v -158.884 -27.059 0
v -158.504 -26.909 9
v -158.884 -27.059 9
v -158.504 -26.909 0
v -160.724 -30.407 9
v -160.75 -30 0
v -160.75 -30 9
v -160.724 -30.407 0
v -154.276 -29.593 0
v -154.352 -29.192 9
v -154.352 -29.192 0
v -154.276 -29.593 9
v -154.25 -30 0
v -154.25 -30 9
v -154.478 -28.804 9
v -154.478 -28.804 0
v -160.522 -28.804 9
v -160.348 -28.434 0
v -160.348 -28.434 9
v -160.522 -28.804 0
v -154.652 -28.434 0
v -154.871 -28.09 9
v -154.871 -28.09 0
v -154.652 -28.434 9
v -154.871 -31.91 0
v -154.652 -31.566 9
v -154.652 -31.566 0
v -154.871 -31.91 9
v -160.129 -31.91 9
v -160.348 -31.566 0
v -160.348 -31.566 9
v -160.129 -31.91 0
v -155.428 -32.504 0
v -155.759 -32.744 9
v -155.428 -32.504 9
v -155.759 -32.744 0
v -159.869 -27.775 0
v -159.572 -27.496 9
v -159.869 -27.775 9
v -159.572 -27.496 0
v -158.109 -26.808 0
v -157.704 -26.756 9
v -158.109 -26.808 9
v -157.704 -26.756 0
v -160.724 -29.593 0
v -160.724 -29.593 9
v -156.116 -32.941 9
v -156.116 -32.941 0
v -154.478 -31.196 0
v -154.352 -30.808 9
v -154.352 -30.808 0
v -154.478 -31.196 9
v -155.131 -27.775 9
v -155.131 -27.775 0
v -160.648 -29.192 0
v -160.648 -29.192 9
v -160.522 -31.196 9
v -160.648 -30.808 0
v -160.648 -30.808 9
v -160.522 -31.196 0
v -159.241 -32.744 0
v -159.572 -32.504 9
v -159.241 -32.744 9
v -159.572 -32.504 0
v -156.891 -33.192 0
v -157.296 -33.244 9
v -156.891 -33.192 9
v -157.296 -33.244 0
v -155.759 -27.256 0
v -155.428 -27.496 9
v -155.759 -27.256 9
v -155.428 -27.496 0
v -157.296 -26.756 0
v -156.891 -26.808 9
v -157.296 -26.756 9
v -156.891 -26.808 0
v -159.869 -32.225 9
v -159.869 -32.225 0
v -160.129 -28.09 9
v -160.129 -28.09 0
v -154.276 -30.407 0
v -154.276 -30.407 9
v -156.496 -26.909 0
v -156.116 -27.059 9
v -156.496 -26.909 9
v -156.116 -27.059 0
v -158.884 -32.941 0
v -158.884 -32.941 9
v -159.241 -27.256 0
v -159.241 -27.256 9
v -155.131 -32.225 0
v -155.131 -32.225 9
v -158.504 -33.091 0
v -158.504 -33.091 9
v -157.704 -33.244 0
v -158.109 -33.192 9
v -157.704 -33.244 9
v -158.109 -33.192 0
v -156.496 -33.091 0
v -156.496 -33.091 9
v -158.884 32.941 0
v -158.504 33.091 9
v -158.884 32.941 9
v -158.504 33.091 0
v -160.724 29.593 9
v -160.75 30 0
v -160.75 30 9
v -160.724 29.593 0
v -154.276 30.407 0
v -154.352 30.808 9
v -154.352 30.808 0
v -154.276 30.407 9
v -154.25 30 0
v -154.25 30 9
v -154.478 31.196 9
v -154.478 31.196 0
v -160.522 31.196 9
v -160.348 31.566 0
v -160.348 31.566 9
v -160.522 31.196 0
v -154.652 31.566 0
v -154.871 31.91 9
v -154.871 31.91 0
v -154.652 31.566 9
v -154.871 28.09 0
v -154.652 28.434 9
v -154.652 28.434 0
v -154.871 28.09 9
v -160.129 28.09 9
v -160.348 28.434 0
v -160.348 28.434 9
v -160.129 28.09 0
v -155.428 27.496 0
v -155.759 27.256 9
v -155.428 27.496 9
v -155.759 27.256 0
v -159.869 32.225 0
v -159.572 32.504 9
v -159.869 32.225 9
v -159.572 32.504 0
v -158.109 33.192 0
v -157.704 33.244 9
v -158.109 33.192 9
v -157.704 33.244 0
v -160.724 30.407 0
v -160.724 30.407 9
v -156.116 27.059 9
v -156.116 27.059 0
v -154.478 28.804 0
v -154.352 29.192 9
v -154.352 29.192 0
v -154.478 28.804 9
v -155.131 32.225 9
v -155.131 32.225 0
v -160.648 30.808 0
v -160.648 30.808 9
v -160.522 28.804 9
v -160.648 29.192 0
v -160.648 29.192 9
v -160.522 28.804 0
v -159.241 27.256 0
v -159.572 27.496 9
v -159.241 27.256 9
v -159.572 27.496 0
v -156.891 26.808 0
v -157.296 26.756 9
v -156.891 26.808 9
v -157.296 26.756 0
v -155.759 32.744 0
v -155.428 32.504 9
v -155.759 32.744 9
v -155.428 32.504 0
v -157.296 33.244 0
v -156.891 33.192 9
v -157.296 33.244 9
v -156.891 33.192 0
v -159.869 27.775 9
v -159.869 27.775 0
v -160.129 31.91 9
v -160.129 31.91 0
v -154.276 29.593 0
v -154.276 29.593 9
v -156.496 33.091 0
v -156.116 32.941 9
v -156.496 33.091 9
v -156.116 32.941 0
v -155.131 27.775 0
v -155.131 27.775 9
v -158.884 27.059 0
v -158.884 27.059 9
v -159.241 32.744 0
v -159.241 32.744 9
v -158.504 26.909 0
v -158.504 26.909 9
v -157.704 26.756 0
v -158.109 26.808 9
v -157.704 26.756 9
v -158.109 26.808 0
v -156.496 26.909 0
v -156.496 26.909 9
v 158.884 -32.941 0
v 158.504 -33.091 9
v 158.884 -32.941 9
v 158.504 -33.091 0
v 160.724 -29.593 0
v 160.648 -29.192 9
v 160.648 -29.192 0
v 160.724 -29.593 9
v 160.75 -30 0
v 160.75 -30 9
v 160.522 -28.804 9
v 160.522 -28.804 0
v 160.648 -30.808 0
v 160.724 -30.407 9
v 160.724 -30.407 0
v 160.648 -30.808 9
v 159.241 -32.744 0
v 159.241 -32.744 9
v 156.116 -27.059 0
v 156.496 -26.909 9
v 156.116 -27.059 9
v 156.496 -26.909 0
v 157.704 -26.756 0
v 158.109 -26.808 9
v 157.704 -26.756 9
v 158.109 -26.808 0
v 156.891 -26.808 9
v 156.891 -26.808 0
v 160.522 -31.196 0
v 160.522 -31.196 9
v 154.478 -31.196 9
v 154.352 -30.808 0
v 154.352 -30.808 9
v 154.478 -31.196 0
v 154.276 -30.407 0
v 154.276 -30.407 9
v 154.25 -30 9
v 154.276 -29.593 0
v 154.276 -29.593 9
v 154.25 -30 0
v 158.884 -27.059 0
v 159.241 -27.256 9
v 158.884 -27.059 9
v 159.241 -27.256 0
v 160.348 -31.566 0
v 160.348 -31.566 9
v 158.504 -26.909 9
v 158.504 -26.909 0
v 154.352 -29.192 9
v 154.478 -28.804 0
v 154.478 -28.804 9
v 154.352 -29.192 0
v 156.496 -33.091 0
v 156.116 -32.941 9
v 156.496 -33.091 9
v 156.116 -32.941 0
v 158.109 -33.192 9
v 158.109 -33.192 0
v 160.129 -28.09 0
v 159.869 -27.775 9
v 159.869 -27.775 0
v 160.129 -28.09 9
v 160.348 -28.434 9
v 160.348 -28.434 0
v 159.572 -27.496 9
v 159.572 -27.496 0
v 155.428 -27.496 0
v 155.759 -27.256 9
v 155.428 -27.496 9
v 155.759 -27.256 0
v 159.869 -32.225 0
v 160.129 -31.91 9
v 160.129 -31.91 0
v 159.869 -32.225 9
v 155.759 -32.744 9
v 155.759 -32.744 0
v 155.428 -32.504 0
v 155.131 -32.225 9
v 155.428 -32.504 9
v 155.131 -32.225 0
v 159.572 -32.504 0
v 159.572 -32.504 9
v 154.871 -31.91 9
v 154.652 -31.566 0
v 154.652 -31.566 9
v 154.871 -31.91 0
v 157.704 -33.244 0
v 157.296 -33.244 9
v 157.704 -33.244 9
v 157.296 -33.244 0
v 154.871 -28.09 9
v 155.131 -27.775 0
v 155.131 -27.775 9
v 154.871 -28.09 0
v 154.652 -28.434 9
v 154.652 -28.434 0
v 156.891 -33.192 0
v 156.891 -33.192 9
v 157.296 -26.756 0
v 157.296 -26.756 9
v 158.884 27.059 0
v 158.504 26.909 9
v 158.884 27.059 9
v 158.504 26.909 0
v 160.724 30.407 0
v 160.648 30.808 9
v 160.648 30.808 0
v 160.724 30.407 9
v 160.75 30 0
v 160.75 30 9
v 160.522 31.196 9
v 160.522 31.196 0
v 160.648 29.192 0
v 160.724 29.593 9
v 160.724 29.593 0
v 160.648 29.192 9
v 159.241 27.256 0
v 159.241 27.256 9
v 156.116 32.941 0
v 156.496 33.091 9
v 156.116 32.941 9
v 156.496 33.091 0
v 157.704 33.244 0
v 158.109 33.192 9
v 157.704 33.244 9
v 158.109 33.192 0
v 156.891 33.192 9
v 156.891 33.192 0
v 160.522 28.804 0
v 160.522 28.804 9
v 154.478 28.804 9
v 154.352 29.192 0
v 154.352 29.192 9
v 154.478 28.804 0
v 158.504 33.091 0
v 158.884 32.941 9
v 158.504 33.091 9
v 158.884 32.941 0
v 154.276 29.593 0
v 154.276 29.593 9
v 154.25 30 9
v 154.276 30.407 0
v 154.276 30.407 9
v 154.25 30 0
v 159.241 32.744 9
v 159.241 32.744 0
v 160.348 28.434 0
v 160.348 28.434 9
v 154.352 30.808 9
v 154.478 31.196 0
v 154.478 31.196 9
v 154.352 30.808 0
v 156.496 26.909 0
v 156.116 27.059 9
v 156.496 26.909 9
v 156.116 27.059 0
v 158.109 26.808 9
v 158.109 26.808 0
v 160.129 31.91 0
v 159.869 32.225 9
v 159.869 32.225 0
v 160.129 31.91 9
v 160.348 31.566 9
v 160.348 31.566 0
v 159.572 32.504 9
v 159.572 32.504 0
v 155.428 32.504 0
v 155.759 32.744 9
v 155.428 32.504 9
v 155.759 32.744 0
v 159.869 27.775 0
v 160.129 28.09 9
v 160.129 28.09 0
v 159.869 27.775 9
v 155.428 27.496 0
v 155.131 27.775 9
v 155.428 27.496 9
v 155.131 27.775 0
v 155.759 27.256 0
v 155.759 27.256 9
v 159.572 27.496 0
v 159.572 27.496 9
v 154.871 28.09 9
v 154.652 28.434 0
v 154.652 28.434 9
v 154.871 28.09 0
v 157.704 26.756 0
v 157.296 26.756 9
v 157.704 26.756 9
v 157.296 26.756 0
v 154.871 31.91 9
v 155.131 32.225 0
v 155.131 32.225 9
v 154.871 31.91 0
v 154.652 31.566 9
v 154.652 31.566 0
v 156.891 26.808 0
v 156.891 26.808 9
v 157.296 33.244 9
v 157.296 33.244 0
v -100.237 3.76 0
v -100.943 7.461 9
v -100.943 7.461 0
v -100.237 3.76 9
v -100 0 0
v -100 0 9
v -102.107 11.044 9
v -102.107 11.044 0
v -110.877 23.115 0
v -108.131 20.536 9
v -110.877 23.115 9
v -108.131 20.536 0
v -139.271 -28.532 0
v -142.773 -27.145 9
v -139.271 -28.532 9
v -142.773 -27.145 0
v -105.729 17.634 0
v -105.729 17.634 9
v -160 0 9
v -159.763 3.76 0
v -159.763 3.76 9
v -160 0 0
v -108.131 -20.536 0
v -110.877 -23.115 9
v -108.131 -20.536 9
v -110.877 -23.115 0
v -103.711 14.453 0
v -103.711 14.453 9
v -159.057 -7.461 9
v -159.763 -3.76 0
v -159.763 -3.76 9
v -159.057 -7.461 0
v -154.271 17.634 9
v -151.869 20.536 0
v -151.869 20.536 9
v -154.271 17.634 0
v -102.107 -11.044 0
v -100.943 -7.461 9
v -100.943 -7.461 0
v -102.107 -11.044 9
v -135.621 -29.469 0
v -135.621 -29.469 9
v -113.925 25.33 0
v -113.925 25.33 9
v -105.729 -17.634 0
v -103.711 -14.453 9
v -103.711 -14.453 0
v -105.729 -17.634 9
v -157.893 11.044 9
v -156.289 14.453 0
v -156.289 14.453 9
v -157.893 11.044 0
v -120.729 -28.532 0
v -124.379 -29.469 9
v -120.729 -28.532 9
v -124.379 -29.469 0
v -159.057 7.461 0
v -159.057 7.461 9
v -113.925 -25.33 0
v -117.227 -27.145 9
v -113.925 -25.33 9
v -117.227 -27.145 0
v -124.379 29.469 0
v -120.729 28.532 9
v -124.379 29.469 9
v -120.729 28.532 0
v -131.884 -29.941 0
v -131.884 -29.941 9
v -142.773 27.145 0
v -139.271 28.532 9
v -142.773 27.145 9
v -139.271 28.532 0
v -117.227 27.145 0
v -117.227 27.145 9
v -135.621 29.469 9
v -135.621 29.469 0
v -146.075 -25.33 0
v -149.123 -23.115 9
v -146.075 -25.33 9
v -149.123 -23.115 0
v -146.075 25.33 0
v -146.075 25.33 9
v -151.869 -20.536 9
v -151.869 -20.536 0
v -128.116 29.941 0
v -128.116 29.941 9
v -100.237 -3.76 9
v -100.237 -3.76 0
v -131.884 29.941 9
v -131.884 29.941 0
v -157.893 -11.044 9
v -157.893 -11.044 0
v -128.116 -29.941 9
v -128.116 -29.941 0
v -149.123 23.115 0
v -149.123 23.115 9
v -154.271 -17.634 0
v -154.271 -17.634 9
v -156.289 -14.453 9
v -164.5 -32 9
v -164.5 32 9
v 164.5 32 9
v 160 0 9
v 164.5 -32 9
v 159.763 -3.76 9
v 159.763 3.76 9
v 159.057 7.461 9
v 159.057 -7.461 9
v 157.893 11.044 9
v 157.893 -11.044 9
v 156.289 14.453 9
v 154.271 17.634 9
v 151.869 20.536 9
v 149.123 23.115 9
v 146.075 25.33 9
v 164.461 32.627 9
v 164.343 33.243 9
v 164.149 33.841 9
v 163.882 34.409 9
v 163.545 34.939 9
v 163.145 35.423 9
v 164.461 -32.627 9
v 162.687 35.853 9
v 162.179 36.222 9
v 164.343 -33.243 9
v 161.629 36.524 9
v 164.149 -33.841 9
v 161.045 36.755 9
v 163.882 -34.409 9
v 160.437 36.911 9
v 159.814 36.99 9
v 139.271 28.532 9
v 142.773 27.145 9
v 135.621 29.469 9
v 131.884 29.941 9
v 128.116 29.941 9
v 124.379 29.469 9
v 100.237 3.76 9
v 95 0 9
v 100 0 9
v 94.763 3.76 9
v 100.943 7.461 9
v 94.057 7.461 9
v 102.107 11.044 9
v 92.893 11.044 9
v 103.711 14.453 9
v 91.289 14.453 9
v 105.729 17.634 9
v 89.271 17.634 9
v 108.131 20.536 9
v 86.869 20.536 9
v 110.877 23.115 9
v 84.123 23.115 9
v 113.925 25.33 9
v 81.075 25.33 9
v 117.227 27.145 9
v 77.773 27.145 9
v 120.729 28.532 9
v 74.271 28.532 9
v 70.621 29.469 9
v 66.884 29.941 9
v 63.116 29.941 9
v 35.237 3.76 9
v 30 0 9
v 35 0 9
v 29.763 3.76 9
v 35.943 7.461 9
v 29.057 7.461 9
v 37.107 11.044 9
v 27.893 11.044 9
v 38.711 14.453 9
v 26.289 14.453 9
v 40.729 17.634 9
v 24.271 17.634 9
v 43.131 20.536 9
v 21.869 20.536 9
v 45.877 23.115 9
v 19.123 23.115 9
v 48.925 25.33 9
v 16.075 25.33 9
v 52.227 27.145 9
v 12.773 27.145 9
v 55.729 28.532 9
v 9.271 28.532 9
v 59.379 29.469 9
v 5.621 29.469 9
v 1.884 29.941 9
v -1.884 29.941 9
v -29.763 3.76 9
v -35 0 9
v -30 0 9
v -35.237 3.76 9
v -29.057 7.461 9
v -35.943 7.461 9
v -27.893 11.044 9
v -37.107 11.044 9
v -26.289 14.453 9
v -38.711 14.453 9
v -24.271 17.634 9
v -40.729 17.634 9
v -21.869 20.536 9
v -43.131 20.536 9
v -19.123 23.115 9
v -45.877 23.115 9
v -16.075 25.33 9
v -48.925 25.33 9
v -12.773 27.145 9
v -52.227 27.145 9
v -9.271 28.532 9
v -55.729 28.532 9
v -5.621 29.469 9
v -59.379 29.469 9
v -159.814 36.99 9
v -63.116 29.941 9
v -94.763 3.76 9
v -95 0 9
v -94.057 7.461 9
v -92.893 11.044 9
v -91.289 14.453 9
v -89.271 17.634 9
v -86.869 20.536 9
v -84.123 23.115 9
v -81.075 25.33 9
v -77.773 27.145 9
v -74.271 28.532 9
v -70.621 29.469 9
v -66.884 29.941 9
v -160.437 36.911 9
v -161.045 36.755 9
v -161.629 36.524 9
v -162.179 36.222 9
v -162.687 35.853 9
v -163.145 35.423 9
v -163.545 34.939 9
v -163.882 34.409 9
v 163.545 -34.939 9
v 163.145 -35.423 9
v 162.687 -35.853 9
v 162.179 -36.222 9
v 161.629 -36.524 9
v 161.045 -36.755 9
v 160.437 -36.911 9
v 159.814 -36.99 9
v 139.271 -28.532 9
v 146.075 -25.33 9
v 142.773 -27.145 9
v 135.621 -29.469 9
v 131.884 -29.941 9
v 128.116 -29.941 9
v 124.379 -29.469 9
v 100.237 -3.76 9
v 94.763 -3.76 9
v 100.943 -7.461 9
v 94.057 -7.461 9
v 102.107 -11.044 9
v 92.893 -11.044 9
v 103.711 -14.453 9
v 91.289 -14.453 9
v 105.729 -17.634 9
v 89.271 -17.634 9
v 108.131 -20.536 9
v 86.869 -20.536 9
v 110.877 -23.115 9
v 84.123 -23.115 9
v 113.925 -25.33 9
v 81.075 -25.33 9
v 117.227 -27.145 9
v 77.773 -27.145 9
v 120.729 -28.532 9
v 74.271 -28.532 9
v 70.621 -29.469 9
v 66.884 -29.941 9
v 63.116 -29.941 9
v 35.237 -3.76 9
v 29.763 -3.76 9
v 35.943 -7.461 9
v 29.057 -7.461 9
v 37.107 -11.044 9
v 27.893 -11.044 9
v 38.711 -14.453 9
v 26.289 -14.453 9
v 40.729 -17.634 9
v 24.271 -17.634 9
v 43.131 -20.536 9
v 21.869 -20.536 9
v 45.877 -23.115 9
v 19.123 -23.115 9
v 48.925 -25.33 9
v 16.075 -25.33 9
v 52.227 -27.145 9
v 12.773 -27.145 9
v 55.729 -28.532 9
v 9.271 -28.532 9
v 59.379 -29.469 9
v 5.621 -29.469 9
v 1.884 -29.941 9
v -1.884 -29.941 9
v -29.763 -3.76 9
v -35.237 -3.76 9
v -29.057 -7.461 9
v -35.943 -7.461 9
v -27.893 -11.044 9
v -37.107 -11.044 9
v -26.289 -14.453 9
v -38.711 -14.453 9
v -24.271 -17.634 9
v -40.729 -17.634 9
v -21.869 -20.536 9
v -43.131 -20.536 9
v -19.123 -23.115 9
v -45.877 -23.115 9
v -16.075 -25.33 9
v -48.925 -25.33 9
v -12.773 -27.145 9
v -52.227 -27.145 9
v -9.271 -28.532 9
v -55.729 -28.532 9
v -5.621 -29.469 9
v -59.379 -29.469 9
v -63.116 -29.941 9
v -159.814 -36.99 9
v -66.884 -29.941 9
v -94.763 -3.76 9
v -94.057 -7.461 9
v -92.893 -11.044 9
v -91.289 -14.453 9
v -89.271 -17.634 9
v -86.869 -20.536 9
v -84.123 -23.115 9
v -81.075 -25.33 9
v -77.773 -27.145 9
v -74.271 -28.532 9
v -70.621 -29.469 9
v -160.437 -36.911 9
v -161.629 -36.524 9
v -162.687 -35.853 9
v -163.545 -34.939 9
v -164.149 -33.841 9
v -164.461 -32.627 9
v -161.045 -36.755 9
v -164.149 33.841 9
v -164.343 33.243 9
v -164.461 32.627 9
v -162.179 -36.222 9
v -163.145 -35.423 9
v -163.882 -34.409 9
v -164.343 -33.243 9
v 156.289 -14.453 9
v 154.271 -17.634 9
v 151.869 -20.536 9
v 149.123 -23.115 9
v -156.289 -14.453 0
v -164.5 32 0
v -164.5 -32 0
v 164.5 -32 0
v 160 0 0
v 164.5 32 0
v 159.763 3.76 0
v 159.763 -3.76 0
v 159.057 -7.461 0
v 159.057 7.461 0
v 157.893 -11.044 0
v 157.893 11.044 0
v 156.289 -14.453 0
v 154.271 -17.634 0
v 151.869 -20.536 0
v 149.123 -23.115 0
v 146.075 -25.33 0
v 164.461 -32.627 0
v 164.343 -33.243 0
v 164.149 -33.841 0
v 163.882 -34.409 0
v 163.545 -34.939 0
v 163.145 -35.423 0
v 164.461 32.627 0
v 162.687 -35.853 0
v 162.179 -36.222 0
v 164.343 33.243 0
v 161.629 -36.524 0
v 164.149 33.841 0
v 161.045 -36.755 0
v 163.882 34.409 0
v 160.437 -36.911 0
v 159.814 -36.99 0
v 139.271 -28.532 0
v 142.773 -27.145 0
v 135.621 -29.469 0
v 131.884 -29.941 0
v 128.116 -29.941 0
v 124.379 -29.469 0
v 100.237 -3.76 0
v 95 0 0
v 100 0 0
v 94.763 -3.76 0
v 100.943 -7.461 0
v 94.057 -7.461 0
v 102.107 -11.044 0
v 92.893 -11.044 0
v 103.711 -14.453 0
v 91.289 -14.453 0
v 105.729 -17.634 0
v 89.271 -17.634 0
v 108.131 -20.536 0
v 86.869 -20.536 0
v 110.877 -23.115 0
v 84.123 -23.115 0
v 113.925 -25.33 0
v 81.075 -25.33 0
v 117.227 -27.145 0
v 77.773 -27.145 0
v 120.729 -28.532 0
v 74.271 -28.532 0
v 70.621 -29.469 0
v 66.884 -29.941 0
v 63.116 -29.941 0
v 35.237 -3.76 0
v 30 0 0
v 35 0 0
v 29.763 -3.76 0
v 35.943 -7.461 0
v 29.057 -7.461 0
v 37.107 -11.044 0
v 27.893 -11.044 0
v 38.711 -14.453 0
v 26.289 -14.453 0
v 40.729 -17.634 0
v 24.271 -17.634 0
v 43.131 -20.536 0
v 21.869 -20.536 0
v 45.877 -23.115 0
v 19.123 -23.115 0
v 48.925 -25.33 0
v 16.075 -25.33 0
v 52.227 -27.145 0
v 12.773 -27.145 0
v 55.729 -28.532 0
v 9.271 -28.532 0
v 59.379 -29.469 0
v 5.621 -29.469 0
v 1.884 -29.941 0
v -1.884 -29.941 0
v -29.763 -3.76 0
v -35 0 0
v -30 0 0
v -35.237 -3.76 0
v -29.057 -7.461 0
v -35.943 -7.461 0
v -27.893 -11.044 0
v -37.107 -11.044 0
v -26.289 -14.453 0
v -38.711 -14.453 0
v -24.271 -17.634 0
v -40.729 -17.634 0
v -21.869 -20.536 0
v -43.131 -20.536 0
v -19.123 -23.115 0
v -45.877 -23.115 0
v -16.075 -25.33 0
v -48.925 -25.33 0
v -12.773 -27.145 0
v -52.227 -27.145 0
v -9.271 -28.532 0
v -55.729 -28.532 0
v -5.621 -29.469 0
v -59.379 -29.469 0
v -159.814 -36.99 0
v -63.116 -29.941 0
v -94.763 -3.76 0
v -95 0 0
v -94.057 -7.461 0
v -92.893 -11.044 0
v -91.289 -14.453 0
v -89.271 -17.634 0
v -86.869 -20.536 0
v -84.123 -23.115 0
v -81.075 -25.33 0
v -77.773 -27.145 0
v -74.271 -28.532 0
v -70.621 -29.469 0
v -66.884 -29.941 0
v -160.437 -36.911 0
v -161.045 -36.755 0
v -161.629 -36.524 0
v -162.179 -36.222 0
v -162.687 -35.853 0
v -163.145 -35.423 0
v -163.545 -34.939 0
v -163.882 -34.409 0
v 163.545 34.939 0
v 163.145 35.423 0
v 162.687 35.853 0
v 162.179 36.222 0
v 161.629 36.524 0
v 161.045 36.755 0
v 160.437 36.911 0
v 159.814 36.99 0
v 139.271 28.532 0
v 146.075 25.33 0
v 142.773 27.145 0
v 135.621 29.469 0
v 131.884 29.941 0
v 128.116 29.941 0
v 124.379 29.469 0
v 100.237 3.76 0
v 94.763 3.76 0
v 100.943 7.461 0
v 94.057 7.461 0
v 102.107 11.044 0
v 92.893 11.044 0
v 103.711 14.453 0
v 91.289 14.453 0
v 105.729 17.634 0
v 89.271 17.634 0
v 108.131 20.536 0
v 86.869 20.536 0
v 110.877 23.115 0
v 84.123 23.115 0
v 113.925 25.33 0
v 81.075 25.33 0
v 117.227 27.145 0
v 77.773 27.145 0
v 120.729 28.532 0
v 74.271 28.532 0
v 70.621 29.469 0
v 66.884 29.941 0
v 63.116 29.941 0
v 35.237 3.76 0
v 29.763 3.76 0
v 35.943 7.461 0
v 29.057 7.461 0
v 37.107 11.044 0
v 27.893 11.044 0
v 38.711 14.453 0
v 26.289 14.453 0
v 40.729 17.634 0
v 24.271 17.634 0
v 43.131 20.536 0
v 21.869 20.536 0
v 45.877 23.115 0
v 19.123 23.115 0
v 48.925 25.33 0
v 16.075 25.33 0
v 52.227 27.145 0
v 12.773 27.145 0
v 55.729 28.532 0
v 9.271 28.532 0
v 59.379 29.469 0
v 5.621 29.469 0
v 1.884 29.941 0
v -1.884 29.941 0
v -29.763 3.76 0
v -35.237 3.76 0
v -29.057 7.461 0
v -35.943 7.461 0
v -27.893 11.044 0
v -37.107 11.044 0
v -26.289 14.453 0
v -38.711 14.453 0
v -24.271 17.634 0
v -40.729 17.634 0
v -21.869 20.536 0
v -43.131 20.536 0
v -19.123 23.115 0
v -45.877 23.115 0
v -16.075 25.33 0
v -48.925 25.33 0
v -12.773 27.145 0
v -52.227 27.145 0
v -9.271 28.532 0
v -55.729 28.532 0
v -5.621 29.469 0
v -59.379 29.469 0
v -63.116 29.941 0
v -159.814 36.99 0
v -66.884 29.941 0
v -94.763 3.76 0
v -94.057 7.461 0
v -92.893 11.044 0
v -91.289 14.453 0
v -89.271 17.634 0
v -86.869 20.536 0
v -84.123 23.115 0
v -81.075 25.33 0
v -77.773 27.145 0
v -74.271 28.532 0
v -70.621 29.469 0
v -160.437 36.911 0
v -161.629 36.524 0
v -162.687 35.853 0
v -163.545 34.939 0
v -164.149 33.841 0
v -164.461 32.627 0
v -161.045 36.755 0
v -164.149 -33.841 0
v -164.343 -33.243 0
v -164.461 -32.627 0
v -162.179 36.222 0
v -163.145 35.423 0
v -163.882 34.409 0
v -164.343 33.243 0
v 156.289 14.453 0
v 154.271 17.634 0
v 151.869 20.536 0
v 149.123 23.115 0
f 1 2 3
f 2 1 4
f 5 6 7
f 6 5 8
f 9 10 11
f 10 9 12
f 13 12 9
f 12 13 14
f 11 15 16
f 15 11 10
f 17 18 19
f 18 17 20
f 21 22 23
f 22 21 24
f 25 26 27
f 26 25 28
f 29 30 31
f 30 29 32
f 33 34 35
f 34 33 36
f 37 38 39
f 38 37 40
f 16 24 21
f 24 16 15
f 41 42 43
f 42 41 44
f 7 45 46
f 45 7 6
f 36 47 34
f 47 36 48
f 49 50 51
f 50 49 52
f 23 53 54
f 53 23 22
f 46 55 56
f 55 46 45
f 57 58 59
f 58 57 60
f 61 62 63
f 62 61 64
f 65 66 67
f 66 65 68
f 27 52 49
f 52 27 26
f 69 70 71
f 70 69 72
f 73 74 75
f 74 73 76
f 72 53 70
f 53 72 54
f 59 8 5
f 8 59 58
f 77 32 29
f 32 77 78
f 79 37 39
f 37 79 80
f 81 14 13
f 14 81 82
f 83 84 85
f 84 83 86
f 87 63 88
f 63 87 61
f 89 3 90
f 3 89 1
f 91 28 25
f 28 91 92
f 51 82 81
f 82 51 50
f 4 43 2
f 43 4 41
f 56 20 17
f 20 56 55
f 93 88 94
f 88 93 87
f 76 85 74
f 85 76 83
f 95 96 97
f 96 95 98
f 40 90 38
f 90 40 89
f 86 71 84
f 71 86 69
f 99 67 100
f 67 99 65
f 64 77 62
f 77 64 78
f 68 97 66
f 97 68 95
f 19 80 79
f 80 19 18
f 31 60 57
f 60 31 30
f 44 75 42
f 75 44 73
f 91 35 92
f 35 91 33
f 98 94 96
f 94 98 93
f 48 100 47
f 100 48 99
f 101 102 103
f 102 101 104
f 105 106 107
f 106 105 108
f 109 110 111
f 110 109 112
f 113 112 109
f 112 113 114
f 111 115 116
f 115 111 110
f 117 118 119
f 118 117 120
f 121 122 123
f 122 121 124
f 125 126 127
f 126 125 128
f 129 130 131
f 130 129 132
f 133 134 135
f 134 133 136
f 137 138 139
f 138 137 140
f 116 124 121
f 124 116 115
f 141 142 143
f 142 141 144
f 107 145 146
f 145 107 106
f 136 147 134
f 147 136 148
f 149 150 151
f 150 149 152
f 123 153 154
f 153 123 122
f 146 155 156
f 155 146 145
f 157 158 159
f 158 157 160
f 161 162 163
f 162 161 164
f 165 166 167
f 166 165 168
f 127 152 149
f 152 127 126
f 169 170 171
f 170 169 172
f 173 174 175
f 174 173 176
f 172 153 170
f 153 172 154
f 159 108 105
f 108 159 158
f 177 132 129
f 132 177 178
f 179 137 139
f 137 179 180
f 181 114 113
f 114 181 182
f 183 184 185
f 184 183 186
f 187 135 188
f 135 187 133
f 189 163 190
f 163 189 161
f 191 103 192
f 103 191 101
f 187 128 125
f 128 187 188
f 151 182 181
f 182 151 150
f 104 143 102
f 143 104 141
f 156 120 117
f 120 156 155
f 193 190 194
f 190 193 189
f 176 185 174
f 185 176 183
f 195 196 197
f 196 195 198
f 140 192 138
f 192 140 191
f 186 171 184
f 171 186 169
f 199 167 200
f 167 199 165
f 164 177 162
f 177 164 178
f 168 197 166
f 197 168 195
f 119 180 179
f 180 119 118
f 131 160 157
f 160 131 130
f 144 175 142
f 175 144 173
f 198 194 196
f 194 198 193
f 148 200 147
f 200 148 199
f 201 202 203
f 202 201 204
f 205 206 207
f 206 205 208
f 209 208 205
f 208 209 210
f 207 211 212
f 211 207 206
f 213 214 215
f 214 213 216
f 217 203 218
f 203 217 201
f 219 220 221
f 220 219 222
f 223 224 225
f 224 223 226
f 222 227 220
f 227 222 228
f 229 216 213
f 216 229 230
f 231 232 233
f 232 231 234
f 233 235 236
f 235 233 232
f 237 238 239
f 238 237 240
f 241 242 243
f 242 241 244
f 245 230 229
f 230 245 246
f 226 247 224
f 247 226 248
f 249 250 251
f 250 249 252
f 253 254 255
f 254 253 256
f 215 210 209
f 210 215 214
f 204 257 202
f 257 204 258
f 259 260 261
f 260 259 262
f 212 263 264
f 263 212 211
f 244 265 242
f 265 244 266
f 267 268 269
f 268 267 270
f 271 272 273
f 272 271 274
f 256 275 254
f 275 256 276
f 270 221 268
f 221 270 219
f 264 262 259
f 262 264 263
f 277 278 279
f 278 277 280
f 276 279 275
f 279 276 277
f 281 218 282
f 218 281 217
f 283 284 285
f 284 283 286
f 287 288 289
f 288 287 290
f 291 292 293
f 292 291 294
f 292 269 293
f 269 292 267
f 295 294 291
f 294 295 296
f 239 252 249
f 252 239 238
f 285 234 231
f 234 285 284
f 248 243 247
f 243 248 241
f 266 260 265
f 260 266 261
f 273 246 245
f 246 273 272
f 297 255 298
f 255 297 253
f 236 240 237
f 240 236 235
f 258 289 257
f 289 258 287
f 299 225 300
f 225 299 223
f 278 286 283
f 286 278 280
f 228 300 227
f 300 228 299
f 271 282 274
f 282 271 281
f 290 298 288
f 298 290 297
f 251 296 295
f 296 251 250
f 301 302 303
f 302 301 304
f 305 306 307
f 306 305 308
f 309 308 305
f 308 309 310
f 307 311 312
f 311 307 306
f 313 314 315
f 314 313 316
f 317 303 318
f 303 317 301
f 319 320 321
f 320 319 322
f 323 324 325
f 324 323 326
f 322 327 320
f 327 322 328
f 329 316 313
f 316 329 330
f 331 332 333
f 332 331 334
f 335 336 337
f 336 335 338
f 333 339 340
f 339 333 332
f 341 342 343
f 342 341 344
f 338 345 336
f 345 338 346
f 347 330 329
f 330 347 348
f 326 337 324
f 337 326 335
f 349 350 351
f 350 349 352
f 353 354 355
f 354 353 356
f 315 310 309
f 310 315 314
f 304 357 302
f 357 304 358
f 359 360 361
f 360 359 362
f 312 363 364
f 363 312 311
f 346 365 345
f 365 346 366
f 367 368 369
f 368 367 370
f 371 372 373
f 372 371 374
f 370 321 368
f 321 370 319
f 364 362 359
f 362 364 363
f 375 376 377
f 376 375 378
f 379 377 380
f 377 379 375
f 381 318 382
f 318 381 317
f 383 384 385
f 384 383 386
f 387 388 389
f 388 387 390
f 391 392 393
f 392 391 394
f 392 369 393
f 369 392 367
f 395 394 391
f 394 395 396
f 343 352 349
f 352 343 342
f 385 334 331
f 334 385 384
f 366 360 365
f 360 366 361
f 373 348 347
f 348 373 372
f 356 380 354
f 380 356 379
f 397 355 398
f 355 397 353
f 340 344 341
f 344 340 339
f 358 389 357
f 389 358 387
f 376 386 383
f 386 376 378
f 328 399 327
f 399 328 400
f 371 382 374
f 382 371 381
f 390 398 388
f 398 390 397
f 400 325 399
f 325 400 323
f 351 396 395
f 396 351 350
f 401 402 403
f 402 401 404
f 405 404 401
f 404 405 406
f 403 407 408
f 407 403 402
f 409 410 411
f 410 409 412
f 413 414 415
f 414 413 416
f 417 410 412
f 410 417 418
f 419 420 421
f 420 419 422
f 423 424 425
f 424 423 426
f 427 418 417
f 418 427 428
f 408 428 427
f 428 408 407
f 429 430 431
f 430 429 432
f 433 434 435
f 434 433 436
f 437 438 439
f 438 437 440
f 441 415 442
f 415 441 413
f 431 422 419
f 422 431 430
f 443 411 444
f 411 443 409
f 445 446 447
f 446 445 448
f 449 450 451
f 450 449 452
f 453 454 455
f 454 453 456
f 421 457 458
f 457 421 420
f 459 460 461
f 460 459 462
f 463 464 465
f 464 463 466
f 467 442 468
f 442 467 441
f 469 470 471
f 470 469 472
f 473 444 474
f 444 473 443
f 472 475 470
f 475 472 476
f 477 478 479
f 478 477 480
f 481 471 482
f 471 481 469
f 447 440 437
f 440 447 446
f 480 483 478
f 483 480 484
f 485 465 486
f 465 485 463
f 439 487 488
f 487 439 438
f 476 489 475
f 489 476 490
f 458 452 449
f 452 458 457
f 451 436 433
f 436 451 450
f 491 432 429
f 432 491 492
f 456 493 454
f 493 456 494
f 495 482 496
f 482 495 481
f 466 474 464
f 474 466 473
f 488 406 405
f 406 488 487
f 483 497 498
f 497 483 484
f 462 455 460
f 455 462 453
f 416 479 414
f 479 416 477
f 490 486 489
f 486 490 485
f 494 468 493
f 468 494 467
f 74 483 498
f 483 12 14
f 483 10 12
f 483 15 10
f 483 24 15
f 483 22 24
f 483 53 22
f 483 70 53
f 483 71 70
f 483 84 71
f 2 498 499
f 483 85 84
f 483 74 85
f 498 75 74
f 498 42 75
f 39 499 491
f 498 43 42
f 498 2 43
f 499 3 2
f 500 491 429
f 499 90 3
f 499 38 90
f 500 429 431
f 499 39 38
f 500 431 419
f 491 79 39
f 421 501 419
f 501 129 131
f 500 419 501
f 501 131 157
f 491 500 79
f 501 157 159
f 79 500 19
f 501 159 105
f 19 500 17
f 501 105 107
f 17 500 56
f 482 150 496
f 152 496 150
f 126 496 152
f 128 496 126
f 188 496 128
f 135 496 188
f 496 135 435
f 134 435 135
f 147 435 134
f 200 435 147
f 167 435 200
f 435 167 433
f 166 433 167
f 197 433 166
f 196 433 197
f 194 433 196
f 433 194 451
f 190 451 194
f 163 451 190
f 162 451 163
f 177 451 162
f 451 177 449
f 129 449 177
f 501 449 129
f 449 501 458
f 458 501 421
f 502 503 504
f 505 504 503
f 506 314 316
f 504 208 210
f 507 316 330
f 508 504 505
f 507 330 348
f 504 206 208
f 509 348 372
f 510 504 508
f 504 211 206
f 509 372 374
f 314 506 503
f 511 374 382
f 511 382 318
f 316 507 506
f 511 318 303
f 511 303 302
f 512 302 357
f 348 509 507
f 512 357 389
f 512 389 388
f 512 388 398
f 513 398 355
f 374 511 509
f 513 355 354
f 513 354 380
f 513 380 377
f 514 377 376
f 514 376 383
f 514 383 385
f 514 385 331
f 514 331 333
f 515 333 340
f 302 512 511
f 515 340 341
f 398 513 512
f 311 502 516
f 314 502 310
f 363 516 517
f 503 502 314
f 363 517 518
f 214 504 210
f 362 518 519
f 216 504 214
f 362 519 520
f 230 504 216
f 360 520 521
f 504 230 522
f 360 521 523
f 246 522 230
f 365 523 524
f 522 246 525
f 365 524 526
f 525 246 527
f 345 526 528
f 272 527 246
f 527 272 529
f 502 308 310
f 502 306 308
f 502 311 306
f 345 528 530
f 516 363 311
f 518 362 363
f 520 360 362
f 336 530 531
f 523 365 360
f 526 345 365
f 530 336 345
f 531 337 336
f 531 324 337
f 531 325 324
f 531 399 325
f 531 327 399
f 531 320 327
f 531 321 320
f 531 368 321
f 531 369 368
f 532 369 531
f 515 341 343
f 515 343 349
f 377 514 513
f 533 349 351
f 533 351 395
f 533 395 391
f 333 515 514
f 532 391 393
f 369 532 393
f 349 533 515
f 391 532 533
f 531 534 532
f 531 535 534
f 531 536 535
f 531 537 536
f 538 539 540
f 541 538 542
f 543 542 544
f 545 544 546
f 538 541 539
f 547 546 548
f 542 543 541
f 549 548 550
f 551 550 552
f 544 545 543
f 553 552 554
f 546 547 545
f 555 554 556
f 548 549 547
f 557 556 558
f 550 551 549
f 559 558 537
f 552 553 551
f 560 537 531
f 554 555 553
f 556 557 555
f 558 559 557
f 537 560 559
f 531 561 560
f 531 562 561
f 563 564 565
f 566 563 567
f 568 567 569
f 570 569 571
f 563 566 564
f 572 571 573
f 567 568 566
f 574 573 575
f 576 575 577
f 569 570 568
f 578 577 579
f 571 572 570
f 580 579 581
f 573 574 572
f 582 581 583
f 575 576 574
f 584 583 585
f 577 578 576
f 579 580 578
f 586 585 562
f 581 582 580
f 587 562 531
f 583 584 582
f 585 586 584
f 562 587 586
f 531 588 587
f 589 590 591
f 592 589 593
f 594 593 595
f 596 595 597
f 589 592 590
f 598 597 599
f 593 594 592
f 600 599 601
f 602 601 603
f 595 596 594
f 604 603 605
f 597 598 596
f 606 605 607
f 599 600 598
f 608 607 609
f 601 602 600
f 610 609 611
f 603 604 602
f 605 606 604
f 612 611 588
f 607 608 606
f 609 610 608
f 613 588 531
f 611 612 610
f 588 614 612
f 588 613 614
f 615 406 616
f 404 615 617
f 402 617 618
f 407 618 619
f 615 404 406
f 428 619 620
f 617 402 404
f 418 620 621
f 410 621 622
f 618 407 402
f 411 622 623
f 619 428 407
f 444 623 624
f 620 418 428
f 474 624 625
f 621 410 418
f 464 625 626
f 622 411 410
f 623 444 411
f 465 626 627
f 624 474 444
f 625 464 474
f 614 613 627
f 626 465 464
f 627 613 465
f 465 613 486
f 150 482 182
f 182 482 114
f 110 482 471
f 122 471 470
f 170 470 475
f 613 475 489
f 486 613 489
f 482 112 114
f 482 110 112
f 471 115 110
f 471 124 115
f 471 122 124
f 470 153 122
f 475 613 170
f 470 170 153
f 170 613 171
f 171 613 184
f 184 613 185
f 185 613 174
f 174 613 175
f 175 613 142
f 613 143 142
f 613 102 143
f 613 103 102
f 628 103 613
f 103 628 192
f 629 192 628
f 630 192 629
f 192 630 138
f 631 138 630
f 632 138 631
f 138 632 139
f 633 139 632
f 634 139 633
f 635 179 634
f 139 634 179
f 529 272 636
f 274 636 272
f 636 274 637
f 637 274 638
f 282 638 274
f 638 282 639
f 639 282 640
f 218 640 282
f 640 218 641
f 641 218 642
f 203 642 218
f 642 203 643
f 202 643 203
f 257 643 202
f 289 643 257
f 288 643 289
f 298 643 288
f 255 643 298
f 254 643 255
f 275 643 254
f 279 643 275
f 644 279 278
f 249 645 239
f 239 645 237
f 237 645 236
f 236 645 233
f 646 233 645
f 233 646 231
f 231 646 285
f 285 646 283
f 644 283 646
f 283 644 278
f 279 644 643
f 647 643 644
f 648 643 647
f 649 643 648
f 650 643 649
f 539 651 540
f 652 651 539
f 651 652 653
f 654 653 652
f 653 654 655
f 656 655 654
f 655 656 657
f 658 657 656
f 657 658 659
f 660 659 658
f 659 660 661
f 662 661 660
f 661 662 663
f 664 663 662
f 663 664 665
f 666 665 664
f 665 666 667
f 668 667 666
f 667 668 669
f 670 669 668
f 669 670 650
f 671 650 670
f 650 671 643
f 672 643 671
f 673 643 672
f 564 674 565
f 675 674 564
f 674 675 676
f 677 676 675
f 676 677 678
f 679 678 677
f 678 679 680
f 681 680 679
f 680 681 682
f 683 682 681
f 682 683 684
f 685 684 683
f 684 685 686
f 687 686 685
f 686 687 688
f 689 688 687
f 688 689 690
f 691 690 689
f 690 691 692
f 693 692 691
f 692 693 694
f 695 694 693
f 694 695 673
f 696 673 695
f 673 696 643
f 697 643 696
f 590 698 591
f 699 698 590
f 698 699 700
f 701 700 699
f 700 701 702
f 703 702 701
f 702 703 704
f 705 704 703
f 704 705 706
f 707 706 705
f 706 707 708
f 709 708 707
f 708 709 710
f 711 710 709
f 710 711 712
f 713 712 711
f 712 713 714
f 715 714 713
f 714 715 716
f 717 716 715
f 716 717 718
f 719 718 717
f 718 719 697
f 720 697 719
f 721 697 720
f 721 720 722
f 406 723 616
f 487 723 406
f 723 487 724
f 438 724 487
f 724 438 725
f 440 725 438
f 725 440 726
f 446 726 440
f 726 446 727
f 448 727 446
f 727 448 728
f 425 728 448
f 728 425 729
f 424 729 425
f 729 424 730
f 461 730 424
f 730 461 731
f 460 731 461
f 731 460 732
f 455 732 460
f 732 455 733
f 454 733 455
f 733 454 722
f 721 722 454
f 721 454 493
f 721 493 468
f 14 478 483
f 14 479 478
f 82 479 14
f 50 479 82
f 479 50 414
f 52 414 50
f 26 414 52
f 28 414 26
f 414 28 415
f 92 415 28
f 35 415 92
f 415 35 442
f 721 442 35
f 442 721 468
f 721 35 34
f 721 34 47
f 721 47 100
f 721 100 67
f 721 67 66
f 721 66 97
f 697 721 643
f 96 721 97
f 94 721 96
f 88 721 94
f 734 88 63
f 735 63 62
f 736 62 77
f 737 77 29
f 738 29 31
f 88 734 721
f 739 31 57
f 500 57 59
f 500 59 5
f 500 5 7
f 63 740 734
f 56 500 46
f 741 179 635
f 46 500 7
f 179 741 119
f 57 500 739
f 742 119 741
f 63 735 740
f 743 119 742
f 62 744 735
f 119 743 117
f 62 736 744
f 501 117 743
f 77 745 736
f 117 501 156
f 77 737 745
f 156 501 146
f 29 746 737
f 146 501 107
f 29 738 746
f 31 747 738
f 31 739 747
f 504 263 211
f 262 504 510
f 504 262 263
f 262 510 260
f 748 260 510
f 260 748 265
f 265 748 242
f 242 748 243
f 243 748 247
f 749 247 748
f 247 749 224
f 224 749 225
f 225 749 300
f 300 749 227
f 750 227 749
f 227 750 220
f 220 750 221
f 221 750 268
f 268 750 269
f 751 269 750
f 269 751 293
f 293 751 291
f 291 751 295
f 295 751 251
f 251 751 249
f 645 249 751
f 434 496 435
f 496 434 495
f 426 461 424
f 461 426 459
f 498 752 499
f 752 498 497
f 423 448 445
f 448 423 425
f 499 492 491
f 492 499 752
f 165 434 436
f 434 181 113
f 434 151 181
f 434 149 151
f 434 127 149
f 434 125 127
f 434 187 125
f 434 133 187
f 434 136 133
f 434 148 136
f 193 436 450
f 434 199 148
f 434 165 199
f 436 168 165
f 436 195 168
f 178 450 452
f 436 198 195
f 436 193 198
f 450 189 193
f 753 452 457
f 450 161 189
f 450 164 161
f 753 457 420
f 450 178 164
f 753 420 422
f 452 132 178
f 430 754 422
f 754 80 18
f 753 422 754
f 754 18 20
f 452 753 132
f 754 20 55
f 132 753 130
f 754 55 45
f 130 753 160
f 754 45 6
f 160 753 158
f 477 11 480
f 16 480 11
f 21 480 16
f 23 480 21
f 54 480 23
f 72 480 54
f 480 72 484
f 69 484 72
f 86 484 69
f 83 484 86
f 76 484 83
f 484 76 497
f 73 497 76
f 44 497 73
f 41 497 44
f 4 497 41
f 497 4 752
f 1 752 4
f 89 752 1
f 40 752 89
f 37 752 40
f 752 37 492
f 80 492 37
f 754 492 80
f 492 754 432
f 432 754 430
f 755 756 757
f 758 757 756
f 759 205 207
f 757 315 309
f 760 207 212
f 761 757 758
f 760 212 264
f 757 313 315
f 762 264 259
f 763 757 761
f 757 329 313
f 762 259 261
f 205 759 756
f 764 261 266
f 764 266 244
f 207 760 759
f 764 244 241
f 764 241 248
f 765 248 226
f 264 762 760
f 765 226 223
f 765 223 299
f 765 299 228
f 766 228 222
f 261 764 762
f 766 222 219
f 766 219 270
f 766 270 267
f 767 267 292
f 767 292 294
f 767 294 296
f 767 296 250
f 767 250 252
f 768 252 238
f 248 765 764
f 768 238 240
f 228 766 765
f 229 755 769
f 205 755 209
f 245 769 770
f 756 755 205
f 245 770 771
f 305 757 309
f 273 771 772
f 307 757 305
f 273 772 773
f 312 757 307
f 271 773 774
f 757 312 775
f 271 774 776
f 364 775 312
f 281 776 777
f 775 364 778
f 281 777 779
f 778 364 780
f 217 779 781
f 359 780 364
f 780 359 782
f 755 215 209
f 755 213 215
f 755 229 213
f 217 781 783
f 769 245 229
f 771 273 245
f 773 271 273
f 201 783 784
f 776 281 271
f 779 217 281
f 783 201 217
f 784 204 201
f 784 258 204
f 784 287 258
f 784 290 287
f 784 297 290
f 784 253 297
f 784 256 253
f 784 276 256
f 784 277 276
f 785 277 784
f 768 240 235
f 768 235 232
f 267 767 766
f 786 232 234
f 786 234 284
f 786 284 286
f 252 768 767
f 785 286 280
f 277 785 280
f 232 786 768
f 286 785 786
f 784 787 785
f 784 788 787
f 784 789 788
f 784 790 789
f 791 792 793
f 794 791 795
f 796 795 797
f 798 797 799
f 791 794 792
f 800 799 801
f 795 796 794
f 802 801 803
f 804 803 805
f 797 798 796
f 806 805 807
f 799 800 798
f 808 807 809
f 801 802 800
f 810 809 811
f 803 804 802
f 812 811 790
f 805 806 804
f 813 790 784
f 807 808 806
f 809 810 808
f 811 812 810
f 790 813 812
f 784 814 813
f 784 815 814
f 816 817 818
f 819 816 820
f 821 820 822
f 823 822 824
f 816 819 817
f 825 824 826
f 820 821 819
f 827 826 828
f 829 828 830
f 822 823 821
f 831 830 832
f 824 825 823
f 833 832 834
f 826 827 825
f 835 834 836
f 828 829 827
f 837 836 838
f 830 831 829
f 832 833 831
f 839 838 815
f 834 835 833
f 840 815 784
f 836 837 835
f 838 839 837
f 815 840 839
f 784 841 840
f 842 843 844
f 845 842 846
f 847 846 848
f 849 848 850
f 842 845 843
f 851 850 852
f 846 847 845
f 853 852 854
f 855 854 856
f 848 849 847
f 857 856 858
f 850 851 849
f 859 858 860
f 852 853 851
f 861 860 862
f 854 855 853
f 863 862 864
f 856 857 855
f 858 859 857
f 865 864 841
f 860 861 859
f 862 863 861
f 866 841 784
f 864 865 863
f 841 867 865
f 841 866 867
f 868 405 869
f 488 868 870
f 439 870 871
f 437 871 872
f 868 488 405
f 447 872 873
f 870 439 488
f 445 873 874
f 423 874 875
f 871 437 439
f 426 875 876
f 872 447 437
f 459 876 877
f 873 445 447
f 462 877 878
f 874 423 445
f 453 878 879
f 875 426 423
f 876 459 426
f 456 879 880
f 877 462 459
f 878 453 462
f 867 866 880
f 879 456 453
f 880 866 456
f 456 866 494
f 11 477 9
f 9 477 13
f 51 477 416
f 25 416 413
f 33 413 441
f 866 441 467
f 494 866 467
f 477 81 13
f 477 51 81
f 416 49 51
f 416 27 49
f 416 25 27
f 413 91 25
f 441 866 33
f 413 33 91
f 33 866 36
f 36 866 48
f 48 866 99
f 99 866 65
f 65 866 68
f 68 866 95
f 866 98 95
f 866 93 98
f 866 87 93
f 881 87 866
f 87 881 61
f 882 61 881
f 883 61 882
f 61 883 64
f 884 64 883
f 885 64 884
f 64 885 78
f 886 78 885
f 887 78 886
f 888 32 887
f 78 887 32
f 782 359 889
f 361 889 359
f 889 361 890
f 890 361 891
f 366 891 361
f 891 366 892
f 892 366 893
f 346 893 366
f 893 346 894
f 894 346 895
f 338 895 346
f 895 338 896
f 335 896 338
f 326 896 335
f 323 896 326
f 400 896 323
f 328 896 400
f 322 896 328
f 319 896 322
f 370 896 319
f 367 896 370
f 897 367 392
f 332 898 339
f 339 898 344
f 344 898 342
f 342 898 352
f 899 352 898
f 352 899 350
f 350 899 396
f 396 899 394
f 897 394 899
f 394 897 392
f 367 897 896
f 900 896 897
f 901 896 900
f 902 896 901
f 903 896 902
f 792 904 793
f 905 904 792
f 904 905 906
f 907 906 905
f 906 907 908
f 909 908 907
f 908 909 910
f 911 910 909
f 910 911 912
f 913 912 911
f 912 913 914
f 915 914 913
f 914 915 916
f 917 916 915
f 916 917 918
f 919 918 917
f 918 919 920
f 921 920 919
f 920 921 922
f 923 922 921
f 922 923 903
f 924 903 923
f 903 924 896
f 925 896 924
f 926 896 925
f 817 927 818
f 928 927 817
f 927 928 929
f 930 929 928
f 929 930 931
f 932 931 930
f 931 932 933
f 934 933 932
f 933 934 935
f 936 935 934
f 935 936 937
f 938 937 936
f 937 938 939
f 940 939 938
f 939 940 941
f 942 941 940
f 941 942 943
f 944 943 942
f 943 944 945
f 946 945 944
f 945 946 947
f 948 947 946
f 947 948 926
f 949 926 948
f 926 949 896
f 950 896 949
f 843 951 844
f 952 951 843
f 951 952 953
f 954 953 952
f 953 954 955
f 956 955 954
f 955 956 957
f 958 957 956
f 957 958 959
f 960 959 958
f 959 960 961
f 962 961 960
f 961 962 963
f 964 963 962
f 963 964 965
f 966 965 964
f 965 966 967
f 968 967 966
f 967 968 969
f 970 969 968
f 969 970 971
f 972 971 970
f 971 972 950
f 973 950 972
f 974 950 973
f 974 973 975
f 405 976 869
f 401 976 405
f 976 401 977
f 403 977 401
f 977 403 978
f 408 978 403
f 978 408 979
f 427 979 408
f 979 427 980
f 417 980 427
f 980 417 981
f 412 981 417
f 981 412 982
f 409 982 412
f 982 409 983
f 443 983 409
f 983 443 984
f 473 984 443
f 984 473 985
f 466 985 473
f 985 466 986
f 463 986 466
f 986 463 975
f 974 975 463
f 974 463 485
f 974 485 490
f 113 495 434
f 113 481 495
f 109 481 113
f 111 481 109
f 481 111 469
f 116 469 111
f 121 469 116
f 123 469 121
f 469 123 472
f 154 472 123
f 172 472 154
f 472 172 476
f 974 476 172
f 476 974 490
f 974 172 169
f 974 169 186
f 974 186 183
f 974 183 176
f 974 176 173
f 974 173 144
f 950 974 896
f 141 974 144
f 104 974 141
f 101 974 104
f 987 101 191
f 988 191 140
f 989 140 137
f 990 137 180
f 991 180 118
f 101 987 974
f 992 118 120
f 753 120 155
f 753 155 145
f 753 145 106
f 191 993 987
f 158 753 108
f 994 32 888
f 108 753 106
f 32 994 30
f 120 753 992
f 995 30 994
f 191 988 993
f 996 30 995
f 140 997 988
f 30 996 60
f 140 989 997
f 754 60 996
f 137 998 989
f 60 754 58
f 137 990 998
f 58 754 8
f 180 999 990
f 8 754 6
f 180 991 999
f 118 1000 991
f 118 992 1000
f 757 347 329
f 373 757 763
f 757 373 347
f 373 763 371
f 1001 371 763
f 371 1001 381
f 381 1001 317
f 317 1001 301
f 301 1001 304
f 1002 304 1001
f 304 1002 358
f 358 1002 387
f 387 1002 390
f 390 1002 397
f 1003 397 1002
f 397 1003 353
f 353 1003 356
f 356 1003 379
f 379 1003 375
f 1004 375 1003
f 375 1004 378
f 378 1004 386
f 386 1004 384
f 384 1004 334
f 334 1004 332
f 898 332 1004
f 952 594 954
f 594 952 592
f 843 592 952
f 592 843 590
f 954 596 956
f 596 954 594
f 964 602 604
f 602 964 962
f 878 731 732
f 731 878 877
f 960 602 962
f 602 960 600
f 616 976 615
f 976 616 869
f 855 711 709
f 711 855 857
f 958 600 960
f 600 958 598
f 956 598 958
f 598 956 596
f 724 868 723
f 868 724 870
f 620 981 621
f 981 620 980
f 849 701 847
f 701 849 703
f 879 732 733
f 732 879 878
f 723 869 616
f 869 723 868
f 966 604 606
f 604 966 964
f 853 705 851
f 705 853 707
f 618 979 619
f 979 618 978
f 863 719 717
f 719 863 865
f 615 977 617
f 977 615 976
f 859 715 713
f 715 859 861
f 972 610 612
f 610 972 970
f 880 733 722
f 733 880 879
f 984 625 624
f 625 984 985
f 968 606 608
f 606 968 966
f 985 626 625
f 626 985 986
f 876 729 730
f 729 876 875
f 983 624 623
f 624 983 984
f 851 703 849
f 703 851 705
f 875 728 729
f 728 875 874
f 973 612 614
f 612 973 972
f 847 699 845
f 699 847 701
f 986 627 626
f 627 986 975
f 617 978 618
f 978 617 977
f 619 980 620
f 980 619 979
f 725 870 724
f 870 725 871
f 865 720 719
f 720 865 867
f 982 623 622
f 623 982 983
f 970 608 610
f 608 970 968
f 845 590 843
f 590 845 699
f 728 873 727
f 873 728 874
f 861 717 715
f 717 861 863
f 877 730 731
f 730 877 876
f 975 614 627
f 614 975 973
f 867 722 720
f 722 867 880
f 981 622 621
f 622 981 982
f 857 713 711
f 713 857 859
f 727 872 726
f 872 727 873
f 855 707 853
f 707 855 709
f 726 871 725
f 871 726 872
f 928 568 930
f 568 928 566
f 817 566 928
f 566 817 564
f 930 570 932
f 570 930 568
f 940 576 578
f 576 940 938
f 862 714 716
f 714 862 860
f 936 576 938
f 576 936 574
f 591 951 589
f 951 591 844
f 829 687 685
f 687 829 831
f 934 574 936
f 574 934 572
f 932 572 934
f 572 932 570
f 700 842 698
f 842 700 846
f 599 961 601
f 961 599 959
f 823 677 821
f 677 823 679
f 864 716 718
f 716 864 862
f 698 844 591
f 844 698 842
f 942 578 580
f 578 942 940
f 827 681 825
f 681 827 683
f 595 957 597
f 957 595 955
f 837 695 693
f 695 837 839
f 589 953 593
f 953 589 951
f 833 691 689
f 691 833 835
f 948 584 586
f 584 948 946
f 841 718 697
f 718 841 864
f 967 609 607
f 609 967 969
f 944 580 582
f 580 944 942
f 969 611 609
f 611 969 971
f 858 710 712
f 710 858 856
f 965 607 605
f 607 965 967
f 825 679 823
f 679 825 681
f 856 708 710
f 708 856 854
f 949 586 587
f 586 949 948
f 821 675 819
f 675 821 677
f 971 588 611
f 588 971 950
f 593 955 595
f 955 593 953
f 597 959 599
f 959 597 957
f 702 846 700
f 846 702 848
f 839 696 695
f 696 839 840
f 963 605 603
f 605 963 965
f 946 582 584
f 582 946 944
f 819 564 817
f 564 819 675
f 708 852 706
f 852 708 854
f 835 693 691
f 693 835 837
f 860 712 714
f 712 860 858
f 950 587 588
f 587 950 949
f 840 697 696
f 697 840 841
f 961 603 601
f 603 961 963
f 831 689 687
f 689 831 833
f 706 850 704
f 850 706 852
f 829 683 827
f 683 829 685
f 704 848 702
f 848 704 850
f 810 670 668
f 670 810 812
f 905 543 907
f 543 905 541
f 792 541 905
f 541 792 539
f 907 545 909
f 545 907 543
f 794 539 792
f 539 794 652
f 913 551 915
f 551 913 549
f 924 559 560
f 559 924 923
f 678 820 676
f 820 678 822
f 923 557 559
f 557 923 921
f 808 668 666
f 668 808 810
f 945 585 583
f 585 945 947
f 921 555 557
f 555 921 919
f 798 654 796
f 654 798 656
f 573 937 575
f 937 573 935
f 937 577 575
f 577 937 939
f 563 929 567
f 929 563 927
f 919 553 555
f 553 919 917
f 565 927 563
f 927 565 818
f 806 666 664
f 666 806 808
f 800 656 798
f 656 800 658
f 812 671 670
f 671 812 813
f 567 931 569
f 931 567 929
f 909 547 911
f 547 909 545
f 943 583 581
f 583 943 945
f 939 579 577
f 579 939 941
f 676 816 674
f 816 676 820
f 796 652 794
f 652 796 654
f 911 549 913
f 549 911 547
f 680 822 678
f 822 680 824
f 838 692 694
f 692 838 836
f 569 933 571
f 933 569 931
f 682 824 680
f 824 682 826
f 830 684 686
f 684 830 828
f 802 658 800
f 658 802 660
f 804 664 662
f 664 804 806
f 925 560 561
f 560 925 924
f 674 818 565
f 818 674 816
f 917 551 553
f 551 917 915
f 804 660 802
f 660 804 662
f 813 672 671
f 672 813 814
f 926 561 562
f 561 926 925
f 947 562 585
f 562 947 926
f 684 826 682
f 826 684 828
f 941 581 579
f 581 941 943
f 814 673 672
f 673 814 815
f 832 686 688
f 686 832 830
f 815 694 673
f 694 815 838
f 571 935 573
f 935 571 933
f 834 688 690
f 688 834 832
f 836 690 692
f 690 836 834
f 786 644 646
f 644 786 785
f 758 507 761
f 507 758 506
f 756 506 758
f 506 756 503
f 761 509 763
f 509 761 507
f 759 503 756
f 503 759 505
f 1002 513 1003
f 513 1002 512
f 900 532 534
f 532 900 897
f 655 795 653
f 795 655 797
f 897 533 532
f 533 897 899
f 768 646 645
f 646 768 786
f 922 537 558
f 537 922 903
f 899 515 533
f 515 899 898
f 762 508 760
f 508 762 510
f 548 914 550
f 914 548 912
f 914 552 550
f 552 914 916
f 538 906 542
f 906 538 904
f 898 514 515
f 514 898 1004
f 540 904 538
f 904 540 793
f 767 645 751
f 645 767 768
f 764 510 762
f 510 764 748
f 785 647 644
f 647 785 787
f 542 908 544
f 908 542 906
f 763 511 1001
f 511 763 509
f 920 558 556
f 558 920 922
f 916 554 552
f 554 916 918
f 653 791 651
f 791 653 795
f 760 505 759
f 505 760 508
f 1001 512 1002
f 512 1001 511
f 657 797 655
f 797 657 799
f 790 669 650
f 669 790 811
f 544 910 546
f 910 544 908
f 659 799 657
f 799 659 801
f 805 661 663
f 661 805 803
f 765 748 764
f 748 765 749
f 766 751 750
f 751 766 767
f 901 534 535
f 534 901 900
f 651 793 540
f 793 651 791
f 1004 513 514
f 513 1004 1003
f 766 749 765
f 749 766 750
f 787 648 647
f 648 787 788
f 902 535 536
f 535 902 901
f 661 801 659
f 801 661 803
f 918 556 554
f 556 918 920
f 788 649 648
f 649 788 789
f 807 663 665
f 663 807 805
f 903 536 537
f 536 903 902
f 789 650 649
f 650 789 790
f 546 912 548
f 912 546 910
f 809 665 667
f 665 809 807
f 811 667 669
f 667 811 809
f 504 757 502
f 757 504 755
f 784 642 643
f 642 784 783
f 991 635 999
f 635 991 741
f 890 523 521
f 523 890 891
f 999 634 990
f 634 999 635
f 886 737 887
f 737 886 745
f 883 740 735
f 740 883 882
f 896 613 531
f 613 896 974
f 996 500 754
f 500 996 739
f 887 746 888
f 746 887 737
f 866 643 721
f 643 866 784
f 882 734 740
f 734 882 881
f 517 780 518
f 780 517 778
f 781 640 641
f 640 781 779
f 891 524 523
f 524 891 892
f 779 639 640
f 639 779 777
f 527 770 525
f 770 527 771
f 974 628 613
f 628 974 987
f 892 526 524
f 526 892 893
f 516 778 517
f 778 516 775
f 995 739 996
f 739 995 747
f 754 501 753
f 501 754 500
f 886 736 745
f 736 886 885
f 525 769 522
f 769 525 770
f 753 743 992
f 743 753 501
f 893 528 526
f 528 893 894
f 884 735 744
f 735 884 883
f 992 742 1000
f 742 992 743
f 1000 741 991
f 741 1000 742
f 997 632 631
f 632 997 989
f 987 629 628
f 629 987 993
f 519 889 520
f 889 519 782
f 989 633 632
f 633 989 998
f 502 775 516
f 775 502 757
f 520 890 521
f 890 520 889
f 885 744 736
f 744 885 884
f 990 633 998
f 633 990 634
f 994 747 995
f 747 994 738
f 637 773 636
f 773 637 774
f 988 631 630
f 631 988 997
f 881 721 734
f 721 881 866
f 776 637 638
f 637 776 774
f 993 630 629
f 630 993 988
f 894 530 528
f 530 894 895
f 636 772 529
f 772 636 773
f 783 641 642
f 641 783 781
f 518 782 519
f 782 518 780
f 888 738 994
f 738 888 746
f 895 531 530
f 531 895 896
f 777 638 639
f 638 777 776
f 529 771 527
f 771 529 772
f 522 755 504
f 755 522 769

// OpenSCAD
$fn = 50;


difference() {
	union() {
		hull() {
			translate(v = [-159.5000000000, 32.0000000000, 0]) {
				cylinder(h = 9, r = 5);
			}
			translate(v = [159.5000000000, 32.0000000000, 0]) {
				cylinder(h = 9, r = 5);
			}
			translate(v = [-159.5000000000, -32.0000000000, 0]) {
				cylinder(h = 9, r = 5);
			}
			translate(v = [159.5000000000, -32.0000000000, 0]) {
				cylinder(h = 9, r = 5);
			}
		}
	}
	union() {
		#translate(v = [-157.5000000000, -30.0000000000, -100.0000000000]) {
			cylinder(h = 200, r = 3.2500000000);
		}
		#translate(v = [-157.5000000000, 30.0000000000, -100.0000000000]) {
			cylinder(h = 200, r = 3.2500000000);
		}
		#translate(v = [157.5000000000, -30.0000000000, -100.0000000000]) {
			cylinder(h = 200, r = 3.2500000000);
		}
		#translate(v = [157.5000000000, 30.0000000000, -100.0000000000]) {
			cylinder(h = 200, r = 3.2500000000);
		}
		#translate(v = [-130.0000000000, 0, 0]) {
			cylinder(h = 9, r = 30.0000000000);
		}
		#translate(v = [-65.0000000000, 0, 0]) {
			cylinder(h = 9, r = 30.0000000000);
		}
		#cylinder(h = 9, r = 30.0000000000);
		#translate(v = [65.0000000000, 0, 0]) {
			cylinder(h = 9, r = 30.0000000000);
		}
		#translate(v = [130.0000000000, 0, 0]) {
			cylinder(h = 9, r = 30.0000000000);
		}
	}
}
